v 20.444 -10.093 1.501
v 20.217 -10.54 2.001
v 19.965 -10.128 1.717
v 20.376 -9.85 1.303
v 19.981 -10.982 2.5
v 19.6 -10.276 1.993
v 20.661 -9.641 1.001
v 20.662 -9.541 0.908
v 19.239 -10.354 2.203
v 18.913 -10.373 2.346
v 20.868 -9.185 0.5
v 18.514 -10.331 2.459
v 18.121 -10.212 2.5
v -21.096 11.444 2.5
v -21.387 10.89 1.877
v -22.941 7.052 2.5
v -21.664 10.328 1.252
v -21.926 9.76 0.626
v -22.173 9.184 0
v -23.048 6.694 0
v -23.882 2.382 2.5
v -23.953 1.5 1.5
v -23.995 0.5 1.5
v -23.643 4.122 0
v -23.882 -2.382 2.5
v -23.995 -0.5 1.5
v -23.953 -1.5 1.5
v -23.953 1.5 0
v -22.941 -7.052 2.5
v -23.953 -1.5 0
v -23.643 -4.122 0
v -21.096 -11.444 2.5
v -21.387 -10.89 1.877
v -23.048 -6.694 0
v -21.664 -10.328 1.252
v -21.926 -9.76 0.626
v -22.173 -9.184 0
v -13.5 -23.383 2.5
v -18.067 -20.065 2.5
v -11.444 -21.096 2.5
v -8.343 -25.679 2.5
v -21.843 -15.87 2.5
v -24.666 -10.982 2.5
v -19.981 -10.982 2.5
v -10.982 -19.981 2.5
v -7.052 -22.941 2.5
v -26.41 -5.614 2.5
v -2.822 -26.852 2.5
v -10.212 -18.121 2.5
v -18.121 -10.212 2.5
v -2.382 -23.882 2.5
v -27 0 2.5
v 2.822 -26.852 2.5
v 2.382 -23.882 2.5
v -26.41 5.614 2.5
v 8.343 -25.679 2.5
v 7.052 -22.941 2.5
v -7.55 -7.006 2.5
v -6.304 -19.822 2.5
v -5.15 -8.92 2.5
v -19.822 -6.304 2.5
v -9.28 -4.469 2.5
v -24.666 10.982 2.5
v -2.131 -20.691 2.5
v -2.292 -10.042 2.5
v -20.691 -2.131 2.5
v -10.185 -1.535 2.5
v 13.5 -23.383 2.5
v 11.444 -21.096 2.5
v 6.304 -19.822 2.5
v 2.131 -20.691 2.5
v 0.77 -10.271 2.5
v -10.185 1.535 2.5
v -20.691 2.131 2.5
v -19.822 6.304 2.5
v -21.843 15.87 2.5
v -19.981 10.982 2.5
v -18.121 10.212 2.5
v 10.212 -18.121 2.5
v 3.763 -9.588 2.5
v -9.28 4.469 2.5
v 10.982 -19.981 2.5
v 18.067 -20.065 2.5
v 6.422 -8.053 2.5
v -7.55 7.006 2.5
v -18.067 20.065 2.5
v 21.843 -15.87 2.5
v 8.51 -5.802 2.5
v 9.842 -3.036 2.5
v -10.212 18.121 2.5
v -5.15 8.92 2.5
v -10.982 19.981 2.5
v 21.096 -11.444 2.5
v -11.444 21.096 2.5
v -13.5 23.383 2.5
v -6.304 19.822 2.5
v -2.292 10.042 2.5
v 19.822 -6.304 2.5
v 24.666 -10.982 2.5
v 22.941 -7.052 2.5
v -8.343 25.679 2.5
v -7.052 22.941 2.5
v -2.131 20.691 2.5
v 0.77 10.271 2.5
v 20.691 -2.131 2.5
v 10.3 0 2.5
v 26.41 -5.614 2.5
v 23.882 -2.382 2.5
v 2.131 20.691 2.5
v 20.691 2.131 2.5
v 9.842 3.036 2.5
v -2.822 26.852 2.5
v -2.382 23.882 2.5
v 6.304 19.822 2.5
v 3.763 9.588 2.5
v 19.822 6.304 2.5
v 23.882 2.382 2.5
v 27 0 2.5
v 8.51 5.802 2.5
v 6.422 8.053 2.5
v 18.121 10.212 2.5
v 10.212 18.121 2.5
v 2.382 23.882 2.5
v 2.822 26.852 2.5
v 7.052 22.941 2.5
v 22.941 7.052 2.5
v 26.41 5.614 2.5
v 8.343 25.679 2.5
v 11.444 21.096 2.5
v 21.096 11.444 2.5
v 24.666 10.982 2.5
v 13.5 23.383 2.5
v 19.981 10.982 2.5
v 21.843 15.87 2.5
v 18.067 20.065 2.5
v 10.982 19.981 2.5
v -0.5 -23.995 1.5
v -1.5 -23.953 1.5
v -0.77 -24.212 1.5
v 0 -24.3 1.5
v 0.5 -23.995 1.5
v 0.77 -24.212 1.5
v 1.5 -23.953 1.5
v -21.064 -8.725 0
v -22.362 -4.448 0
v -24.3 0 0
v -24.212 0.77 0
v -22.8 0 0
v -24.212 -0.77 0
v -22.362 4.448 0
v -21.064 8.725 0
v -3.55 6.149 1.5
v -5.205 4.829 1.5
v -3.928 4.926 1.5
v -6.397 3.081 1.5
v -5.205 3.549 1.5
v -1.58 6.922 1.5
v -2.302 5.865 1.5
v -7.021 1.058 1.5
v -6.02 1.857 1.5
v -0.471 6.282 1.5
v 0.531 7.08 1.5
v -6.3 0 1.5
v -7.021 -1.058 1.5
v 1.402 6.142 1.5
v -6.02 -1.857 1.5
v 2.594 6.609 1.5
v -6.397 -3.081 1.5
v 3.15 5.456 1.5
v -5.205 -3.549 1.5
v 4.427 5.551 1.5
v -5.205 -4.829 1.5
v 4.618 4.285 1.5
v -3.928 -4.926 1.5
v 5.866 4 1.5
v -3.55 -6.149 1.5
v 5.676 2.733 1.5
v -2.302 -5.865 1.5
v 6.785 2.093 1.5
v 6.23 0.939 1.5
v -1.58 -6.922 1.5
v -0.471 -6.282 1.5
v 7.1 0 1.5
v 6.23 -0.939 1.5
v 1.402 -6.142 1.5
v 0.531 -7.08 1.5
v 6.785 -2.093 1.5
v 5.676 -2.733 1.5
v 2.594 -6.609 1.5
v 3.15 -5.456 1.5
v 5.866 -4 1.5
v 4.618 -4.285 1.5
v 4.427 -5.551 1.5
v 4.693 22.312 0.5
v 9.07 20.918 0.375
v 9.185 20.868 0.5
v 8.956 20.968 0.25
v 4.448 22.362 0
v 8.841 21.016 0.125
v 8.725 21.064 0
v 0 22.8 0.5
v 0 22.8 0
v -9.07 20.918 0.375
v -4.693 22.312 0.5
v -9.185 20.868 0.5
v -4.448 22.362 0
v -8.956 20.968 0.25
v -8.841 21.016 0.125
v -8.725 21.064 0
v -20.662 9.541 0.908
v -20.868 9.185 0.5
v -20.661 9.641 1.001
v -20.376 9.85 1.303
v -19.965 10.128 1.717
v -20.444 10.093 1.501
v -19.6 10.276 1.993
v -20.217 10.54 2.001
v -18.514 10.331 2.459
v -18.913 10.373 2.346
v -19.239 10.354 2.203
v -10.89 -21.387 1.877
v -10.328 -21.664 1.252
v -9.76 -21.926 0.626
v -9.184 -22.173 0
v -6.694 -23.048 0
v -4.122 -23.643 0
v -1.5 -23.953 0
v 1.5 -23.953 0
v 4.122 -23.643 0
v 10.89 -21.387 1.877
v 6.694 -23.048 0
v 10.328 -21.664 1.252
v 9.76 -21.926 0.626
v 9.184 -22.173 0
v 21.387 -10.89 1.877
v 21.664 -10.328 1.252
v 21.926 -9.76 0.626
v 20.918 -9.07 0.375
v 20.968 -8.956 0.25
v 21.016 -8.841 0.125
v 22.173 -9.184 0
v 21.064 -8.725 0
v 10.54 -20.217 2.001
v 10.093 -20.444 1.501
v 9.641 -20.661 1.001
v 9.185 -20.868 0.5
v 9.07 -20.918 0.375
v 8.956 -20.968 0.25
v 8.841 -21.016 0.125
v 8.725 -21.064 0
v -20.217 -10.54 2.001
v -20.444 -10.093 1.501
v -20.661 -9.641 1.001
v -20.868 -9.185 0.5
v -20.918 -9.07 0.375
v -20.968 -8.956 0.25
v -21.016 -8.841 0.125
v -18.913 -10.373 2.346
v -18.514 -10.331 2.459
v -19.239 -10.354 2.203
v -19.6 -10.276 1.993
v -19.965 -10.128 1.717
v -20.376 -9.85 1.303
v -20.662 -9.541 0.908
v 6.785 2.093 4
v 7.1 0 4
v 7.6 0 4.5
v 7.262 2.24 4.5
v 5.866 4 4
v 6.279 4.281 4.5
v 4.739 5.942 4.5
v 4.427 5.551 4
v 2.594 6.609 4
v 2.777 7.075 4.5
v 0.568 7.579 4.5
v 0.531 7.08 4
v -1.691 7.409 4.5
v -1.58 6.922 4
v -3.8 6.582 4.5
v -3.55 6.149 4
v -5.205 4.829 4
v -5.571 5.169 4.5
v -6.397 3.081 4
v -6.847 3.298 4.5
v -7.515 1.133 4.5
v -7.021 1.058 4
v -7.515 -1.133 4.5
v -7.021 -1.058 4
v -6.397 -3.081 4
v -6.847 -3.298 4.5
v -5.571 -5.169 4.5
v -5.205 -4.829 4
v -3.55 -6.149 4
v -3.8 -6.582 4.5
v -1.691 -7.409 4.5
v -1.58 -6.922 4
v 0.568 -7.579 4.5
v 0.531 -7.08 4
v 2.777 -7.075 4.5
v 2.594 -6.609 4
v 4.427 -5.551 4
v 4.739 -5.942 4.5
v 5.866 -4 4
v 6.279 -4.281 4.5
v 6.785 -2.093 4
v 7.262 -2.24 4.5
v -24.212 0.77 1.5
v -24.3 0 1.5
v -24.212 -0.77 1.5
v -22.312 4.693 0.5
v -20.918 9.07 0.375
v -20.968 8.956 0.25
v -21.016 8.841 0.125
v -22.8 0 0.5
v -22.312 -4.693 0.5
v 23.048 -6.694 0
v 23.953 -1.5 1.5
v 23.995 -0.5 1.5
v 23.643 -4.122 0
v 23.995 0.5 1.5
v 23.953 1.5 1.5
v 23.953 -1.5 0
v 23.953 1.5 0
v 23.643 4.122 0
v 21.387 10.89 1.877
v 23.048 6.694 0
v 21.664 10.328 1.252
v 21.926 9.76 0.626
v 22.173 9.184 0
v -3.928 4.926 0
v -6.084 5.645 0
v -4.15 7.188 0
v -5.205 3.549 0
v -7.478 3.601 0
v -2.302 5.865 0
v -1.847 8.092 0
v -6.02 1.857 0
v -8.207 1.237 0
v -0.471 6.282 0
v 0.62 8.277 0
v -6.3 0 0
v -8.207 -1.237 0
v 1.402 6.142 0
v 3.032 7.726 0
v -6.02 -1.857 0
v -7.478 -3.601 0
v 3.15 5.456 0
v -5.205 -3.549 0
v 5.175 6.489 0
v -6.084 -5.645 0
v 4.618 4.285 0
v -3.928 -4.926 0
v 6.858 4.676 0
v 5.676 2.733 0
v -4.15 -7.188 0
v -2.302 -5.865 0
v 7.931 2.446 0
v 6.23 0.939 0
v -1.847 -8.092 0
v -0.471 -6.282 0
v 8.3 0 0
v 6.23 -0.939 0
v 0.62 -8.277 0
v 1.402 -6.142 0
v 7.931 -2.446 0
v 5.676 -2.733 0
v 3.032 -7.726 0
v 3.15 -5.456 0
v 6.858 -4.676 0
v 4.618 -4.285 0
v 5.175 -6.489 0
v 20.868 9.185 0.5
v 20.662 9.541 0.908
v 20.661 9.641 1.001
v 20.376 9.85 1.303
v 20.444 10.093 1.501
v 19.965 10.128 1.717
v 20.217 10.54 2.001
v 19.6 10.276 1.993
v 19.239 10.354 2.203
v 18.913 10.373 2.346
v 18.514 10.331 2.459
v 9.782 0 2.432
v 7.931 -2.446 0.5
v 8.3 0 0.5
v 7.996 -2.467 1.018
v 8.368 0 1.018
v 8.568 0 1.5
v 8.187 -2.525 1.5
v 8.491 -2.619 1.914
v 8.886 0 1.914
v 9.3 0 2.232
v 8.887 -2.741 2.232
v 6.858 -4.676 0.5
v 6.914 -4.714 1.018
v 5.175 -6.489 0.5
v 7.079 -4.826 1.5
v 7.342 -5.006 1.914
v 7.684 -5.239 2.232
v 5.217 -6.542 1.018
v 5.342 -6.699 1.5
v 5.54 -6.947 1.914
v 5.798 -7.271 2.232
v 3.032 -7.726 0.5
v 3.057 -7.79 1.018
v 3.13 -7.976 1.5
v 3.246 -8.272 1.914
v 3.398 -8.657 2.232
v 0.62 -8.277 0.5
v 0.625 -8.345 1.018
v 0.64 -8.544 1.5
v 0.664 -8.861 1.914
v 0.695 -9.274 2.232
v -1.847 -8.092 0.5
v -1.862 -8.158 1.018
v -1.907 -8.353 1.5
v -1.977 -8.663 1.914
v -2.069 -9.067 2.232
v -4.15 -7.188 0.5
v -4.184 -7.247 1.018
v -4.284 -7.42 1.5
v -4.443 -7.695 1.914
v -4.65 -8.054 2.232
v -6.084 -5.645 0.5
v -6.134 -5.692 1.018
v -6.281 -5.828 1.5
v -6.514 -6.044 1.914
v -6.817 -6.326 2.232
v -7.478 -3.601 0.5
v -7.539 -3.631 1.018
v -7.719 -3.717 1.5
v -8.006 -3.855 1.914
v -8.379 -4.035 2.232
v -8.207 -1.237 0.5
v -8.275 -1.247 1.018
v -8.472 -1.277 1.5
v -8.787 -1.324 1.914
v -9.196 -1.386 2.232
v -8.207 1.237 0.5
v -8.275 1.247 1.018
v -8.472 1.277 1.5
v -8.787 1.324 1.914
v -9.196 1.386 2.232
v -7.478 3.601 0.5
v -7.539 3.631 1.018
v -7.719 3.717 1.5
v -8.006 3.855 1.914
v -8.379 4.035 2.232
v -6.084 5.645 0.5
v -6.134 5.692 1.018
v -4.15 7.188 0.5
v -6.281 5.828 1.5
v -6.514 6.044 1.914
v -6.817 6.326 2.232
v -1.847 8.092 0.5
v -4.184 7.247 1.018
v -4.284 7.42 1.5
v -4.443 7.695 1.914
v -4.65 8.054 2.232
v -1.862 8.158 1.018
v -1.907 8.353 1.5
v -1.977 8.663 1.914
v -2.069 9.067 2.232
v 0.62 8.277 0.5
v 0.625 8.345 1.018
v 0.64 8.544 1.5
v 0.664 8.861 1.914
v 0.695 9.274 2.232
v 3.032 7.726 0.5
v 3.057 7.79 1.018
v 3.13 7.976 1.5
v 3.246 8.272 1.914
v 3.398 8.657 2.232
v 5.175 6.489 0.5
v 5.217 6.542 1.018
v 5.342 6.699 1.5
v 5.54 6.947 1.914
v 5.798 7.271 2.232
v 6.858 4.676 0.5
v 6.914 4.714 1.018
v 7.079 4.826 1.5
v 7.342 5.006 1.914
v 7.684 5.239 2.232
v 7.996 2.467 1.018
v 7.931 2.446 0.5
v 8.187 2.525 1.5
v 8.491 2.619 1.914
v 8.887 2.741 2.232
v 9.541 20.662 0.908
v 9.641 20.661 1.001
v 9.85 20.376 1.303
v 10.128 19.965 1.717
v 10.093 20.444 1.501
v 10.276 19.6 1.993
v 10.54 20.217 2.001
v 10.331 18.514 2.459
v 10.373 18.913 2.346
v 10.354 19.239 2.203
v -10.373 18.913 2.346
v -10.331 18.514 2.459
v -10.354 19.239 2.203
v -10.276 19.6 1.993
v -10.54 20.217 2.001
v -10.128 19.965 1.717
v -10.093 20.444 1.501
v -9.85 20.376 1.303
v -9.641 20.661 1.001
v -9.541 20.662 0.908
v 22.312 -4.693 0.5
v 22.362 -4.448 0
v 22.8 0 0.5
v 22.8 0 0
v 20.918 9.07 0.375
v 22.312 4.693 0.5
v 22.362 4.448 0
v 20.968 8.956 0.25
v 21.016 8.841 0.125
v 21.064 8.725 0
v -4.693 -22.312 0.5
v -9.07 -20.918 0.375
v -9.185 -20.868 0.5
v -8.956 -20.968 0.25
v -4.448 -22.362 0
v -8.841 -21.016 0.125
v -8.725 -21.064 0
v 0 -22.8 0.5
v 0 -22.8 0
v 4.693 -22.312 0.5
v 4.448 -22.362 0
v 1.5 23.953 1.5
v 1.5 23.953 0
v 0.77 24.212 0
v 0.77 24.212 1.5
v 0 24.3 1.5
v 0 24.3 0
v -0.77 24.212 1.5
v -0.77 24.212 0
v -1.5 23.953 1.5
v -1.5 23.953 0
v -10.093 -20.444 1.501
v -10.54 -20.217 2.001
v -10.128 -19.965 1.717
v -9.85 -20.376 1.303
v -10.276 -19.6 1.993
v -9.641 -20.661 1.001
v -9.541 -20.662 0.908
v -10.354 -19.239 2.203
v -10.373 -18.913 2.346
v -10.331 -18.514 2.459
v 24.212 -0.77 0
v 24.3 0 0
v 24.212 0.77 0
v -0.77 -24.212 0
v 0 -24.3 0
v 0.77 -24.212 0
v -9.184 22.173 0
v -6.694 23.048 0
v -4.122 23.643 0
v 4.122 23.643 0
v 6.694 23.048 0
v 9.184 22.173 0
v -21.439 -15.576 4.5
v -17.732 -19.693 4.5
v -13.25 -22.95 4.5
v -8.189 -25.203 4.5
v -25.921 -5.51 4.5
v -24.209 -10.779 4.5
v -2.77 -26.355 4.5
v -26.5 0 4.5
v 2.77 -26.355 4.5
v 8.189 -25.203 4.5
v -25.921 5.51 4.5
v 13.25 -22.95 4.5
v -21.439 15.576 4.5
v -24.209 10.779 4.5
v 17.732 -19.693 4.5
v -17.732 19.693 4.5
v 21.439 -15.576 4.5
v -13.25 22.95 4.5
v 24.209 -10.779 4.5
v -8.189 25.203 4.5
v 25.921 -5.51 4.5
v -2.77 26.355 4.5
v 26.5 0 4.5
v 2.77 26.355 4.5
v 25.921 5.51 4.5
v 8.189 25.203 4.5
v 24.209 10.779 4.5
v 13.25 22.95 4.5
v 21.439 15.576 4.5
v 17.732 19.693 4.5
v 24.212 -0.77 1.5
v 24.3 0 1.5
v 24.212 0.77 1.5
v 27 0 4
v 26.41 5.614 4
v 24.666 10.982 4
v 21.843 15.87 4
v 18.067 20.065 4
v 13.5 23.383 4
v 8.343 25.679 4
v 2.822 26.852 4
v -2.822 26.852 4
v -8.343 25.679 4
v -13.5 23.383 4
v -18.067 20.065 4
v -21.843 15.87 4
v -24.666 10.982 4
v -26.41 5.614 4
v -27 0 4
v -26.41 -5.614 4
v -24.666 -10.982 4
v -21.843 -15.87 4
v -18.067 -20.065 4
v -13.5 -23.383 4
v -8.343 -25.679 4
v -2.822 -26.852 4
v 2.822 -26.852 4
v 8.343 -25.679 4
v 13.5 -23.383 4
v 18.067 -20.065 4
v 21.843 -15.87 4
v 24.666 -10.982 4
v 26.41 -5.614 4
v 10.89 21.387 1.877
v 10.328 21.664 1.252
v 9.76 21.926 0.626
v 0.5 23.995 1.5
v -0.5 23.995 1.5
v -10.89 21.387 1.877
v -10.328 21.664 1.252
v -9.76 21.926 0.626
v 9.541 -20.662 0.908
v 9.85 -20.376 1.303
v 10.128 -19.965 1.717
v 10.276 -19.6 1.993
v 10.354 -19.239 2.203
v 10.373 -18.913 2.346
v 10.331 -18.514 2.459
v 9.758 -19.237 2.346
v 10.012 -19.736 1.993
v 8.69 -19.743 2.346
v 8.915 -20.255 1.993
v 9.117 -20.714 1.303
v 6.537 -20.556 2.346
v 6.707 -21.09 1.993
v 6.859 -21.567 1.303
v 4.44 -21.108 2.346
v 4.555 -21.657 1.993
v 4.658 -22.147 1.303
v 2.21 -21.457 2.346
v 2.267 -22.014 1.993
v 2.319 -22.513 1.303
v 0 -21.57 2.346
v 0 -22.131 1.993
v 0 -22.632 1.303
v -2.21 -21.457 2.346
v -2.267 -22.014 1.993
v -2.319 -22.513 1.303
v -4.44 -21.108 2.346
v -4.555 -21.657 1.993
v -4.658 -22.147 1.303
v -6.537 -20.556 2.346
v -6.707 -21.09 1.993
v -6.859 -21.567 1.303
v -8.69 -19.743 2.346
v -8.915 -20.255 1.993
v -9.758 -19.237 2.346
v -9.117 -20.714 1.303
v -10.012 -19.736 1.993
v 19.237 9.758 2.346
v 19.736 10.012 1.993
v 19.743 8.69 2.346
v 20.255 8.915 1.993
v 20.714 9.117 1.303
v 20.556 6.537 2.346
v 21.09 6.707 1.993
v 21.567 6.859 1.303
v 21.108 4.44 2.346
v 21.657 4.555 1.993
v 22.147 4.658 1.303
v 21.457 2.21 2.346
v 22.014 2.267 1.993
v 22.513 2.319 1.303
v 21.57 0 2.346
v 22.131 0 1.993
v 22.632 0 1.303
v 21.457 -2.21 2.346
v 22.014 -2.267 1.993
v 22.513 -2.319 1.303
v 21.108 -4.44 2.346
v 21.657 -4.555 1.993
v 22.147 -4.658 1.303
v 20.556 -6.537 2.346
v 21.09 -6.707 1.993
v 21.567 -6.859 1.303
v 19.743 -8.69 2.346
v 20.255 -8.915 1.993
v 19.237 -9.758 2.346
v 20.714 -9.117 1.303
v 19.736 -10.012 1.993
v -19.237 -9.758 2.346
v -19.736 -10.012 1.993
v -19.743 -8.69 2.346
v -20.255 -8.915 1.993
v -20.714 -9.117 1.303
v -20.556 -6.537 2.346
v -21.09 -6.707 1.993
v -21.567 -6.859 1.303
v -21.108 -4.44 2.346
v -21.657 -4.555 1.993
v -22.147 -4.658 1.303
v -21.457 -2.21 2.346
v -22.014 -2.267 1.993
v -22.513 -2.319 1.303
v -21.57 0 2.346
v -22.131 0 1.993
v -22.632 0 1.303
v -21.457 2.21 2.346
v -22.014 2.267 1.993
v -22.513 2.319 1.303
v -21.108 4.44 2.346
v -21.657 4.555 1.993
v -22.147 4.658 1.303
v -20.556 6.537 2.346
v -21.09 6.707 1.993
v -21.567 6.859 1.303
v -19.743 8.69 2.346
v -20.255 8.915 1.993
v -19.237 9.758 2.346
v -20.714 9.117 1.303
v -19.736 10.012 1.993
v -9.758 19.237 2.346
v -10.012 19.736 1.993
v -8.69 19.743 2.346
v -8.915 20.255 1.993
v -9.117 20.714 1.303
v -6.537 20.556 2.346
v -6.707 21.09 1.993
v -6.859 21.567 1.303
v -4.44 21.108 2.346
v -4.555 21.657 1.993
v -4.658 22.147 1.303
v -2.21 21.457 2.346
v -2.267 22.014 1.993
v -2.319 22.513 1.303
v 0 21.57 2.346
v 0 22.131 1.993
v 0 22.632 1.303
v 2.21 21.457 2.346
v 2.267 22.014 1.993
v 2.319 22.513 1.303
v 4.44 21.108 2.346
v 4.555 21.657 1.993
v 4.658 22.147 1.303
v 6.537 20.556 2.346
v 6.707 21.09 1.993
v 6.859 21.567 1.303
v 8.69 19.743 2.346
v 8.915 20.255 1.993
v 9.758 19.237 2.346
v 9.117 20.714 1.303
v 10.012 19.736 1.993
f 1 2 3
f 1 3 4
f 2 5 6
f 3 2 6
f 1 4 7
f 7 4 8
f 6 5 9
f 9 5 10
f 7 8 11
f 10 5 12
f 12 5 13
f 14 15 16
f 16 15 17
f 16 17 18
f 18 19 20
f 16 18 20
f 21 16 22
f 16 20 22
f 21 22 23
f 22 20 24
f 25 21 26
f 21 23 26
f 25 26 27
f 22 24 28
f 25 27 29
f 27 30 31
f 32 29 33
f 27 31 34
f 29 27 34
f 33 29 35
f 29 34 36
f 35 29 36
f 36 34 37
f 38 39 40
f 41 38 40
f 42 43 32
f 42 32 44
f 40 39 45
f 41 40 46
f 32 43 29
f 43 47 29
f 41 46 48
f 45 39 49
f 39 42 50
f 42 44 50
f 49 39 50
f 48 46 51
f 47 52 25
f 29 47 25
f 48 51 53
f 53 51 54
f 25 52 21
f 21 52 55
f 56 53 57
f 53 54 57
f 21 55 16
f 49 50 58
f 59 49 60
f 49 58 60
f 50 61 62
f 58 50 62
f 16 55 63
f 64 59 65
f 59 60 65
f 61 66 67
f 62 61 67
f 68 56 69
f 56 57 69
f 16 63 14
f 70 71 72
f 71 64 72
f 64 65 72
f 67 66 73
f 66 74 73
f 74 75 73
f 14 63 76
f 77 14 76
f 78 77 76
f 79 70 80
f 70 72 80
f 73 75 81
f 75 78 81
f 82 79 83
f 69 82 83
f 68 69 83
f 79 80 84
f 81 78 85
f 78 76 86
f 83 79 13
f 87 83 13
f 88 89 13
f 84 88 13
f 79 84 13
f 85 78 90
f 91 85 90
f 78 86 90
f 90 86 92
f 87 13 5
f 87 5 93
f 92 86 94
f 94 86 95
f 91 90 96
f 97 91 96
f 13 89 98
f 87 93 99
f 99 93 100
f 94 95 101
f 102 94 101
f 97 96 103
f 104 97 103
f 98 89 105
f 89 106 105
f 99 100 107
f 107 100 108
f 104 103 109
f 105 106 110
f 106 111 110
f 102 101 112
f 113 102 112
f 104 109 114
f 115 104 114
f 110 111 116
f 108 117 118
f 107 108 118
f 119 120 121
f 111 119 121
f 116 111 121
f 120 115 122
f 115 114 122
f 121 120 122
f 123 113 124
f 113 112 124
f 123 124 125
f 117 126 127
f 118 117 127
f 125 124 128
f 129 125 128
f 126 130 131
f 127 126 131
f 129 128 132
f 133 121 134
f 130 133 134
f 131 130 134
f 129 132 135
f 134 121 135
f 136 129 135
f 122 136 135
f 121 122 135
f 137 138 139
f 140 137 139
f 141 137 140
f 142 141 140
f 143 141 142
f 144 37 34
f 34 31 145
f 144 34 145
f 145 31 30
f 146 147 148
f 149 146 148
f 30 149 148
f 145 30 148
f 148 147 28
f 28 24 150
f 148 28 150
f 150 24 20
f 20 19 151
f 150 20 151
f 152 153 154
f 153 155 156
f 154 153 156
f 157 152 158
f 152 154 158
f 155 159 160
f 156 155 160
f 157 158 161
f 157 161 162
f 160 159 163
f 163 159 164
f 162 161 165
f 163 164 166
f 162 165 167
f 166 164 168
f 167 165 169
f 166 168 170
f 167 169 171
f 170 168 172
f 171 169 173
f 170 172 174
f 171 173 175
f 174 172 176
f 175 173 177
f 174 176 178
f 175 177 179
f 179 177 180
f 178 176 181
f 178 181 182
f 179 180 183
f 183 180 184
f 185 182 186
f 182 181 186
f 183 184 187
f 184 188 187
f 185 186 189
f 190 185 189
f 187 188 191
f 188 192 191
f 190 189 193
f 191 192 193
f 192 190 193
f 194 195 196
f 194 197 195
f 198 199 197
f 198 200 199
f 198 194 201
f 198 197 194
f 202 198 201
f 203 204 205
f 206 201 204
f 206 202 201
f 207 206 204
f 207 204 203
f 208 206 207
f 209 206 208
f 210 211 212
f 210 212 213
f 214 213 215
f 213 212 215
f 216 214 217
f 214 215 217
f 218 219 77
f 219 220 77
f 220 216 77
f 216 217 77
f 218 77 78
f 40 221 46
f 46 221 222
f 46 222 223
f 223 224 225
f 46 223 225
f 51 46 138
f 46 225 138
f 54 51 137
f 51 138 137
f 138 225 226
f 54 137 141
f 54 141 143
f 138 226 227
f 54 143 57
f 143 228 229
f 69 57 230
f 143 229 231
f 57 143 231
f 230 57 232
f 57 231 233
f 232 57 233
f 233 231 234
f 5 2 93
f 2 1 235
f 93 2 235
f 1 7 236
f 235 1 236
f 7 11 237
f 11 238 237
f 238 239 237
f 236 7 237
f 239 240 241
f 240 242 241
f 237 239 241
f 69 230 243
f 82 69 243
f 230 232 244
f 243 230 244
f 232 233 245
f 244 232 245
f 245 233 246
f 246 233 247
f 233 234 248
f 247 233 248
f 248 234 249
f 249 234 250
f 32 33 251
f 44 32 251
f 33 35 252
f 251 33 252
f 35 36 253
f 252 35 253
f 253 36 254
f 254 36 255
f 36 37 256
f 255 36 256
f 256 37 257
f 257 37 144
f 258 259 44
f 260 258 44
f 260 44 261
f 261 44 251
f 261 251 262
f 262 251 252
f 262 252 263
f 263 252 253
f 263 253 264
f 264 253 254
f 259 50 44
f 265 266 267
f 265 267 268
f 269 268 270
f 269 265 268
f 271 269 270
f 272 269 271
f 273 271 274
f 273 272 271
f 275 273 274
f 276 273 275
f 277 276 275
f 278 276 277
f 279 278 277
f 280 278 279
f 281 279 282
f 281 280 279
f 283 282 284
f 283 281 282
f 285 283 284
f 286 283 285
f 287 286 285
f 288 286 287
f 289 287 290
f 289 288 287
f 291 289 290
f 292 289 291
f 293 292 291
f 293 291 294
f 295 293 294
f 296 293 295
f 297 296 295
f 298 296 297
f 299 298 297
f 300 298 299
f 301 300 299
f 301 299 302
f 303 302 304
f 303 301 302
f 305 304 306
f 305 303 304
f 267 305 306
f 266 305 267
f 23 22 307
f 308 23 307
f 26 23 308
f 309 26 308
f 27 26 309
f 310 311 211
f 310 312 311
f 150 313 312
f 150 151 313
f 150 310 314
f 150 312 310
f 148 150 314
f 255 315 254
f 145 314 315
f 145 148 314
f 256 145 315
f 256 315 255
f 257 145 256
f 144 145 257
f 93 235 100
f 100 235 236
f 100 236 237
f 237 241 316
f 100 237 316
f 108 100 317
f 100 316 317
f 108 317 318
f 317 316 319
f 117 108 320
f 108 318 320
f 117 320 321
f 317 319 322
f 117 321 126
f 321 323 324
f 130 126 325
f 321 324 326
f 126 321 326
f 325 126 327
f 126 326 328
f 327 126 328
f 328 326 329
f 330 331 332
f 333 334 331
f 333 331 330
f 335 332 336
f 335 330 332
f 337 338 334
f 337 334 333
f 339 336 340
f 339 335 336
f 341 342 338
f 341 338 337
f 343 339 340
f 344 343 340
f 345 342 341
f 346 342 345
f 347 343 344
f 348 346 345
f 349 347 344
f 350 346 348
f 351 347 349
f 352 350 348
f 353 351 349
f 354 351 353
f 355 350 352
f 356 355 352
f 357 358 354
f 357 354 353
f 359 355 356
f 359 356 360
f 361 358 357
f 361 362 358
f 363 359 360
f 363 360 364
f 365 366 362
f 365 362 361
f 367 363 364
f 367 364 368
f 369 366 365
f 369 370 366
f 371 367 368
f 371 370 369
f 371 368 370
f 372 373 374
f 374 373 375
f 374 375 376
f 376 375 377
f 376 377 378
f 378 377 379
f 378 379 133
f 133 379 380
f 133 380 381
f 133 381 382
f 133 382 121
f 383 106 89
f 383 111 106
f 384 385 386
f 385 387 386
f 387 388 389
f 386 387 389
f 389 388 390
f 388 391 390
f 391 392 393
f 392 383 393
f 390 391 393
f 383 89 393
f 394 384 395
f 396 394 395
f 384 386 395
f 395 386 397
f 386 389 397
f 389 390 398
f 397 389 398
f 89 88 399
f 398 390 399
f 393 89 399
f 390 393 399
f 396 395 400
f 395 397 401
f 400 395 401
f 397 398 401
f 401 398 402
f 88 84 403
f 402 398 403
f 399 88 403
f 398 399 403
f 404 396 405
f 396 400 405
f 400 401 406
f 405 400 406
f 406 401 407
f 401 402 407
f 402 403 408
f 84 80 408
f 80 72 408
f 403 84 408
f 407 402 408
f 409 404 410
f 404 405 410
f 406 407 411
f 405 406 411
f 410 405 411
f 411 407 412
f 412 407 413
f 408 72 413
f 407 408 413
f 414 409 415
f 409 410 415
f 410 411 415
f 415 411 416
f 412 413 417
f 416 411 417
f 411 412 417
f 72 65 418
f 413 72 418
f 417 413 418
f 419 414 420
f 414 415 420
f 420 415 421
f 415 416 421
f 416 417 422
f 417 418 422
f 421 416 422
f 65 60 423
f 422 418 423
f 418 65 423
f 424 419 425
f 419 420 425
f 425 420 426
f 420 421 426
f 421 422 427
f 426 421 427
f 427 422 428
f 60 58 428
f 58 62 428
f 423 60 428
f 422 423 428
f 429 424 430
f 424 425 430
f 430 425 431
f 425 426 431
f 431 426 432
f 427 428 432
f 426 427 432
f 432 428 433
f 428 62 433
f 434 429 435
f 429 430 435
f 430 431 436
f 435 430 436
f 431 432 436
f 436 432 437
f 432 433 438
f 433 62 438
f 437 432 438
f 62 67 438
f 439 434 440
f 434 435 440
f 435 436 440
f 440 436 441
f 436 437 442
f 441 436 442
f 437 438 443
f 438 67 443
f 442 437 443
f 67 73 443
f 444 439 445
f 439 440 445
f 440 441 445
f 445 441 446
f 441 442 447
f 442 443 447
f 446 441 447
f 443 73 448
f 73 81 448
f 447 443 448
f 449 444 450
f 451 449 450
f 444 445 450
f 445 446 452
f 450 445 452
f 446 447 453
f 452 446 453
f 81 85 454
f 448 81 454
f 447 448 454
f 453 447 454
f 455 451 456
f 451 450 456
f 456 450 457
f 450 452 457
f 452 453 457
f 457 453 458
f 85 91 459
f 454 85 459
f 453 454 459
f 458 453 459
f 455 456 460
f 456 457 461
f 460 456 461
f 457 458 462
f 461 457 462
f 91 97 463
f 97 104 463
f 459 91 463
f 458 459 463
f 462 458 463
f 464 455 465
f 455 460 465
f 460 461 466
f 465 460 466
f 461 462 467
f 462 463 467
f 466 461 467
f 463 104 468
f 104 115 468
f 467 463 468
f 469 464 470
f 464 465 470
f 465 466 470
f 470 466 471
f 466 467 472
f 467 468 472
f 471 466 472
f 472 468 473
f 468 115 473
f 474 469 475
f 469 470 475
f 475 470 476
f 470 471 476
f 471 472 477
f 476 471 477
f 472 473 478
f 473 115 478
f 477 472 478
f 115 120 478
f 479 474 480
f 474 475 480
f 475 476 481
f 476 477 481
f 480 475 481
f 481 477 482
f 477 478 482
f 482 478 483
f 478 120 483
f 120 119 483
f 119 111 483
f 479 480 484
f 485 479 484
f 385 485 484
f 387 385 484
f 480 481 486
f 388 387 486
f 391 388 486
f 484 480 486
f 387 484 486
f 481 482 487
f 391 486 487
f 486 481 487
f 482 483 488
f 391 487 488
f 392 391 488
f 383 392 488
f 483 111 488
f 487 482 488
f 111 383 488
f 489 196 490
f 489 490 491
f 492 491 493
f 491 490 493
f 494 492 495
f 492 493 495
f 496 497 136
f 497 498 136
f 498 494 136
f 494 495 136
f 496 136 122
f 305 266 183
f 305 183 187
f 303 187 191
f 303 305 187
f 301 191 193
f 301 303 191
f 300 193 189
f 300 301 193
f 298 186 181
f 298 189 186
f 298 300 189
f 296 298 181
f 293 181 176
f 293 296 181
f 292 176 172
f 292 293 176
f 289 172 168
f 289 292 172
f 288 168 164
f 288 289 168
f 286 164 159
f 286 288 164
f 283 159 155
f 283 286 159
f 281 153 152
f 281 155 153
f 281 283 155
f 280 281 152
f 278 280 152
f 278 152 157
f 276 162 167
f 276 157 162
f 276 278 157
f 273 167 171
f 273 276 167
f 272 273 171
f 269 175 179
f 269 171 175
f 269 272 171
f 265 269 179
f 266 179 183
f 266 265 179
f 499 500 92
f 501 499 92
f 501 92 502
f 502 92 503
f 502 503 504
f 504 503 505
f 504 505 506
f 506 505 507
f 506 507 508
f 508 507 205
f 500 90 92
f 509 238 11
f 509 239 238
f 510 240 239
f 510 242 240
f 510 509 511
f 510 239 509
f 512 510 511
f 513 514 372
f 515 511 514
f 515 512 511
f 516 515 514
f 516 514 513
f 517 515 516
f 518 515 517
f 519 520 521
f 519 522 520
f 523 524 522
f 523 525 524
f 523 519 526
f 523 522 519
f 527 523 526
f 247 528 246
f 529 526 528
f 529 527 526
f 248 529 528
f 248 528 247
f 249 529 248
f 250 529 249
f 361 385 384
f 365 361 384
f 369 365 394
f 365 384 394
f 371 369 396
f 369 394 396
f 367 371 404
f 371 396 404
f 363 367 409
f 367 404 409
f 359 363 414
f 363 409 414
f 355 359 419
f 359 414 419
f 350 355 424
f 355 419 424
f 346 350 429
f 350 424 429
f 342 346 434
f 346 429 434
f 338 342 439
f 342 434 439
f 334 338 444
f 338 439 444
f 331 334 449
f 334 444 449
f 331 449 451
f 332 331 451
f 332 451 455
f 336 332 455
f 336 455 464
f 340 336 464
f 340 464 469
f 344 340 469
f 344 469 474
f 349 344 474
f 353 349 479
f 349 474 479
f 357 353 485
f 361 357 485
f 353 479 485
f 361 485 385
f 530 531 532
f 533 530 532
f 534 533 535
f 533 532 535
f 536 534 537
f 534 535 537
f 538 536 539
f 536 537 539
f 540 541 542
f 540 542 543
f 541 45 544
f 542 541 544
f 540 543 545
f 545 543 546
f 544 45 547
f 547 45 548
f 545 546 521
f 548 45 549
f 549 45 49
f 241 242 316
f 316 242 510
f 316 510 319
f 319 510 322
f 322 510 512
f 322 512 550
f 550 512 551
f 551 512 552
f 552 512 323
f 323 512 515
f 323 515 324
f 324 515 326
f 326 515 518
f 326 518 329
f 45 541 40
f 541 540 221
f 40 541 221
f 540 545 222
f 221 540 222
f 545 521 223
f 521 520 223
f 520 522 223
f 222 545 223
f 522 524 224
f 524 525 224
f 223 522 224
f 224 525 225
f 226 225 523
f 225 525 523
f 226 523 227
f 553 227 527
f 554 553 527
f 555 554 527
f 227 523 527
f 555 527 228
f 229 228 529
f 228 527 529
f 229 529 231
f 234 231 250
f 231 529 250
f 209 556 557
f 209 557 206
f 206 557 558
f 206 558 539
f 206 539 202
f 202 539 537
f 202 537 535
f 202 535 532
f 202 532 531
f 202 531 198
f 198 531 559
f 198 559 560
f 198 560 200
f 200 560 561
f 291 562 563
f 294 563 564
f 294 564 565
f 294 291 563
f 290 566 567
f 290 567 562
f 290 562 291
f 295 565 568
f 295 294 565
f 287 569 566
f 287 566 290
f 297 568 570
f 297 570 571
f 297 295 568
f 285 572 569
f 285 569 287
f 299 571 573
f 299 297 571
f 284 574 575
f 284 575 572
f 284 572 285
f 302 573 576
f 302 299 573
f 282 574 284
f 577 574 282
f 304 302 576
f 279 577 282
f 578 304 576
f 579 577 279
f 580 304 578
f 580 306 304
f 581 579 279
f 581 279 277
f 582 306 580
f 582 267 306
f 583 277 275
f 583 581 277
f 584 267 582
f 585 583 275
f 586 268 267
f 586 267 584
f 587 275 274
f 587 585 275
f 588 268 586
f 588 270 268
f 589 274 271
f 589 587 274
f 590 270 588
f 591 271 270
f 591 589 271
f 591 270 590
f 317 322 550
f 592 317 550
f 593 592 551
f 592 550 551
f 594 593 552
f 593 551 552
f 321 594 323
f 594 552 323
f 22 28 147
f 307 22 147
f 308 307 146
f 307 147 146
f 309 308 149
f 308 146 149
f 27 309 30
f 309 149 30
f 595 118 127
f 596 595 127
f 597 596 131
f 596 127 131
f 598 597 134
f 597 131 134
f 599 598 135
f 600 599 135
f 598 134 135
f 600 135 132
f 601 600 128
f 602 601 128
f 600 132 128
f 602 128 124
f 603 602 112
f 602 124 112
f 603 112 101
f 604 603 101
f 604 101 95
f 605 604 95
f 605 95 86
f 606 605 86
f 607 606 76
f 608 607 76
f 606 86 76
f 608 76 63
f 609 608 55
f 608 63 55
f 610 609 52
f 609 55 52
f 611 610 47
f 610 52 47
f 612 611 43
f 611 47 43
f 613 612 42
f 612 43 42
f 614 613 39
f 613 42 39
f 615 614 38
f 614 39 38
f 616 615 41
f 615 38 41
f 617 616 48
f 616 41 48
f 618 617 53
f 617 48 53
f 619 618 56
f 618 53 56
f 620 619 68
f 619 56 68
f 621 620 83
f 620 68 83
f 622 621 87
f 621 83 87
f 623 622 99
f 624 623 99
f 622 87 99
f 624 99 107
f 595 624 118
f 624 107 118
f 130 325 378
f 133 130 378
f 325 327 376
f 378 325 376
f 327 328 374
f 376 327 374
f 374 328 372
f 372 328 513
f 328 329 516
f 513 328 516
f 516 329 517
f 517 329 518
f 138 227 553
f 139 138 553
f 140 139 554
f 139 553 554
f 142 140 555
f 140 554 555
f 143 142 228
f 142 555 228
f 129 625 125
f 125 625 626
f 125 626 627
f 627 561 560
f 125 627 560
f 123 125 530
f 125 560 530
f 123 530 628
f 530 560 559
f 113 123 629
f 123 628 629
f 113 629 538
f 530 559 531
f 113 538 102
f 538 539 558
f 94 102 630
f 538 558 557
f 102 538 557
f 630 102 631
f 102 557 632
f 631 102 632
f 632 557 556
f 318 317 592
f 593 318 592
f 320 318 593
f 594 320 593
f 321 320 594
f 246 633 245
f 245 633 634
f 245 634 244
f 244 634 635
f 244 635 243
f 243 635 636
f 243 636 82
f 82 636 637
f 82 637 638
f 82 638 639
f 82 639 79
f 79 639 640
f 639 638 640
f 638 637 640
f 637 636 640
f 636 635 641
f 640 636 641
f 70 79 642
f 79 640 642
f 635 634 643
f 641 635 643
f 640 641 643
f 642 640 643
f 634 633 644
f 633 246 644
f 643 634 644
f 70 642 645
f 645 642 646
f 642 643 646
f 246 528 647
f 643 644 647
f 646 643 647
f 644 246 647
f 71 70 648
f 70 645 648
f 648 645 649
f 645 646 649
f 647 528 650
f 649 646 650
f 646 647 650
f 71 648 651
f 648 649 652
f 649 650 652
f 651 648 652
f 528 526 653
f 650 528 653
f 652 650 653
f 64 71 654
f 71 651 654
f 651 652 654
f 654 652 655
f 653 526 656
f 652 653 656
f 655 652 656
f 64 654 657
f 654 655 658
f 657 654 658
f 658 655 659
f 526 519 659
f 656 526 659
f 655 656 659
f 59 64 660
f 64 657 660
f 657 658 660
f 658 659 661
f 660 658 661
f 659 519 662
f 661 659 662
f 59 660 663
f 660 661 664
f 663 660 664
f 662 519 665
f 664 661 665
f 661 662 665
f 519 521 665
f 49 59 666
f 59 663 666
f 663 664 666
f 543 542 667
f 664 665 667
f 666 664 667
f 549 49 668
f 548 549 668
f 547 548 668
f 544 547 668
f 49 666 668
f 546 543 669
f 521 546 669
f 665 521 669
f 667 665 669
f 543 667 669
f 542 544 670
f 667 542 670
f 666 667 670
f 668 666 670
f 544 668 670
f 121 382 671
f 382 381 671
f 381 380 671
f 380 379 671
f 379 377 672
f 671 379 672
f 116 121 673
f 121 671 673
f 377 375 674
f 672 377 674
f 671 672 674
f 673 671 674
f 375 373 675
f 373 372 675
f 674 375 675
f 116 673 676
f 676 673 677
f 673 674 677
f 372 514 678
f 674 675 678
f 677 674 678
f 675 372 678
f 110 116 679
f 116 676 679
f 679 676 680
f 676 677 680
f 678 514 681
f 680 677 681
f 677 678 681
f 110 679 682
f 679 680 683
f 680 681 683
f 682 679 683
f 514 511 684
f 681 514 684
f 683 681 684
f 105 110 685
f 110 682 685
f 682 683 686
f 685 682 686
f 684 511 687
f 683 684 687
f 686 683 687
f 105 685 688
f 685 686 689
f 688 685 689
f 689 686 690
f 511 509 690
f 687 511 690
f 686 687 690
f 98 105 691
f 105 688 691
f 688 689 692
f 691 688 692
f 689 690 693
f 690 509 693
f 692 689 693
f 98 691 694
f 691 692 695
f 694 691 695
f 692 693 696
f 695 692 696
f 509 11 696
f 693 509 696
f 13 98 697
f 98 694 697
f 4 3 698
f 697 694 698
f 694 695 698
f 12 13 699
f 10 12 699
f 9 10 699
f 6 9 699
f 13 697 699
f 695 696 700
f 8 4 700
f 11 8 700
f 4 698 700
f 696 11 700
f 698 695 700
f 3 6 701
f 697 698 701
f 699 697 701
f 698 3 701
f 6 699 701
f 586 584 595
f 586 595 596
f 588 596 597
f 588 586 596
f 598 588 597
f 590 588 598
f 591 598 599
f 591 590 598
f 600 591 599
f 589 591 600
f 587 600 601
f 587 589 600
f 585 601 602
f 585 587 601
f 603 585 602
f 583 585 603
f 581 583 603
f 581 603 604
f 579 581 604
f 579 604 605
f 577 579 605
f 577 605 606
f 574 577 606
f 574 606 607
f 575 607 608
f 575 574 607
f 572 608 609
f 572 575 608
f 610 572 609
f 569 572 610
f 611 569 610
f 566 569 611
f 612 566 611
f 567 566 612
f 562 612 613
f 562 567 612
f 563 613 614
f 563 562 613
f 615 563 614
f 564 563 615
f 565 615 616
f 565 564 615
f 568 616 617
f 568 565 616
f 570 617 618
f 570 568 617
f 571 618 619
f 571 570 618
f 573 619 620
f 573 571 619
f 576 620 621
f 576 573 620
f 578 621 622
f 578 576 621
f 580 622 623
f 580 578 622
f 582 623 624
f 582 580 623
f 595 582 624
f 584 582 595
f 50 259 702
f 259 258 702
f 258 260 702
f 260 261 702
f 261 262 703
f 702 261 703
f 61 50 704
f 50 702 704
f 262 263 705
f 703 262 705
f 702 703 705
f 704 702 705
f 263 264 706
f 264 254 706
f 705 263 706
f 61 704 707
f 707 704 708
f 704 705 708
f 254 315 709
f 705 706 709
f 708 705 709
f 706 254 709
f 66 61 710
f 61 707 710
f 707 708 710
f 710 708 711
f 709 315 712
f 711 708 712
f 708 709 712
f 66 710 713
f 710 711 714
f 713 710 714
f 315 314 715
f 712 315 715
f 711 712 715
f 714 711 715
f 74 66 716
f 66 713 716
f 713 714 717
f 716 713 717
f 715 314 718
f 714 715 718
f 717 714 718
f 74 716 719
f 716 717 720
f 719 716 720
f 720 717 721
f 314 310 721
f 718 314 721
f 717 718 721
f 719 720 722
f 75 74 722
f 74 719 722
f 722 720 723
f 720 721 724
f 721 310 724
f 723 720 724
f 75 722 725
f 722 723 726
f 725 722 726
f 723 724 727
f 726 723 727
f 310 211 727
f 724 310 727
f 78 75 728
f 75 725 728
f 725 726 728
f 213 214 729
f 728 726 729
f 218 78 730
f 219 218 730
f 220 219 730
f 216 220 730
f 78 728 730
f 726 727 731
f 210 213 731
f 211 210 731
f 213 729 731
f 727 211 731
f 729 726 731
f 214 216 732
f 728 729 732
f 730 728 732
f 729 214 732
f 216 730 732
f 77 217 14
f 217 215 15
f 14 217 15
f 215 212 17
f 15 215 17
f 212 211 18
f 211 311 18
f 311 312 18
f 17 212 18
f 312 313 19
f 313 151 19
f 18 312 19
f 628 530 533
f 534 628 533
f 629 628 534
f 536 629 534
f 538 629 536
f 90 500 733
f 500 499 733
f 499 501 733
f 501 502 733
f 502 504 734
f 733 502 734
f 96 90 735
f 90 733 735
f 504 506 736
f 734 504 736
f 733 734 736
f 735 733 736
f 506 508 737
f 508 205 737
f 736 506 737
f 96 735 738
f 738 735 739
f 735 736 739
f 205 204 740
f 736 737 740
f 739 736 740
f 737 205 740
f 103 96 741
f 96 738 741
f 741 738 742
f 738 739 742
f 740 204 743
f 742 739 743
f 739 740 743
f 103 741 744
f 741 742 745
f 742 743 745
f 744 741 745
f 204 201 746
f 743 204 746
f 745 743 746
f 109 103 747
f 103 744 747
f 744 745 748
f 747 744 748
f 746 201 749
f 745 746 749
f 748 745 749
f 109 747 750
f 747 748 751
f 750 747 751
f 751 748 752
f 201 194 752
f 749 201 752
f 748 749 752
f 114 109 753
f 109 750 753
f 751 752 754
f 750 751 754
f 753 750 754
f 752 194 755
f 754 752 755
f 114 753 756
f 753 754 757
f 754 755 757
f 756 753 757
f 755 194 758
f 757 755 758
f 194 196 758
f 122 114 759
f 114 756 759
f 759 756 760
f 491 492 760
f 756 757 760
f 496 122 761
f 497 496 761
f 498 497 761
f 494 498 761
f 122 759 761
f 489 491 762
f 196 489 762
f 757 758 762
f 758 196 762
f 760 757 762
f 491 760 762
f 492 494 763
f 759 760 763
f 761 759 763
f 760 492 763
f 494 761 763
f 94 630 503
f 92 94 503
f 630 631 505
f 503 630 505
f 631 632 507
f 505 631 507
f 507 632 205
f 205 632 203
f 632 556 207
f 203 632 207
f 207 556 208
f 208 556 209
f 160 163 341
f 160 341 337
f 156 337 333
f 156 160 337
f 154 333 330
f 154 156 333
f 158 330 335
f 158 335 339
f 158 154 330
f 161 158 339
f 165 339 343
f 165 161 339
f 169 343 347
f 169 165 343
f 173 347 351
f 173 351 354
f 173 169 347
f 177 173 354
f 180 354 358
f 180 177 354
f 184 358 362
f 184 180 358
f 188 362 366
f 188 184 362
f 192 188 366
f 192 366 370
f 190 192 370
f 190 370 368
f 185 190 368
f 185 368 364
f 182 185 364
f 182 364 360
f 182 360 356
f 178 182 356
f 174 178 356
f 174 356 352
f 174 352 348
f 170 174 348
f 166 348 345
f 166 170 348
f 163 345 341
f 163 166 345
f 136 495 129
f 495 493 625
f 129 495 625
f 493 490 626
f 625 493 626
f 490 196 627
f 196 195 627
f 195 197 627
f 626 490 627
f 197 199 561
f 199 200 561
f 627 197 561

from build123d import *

# Parameters (mm, degrees)
SKETCH1_R                    = 24
SKETCH1_R_2                  = 22.8
BOSS_EXTRUDE1_DEPTH          = 2.5
BOSS_EXTRUDE5_START          = -2.5
BOSS_EXTRUDE5_DEPTH          = 1.5
CIRPATTERN1_COUNT            = 4
SKETCH2_R                    = 27
BOSS_EXTRUDE2_DEPTH          = 2
SKETCH3_R                    = 7.1
CUT_EXTRUDE1_DEPTH           = 39.448016854
SKETCH4_R                    = 8.3
SKETCH4_R_2                  = 7.1
BOSS_EXTRUDE3_DEPTH          = 2.5
BOSS_EXTRUDE4_START          = -1.5
SKETCH5_R                    = 8.3
SKETCH5_R_2                  = 6.3
BOSS_EXTRUDE4_DEPTH          = 1.5
CUT_EXTRUDE2_DEPTH           = 2.5
CHAMFER2_SIZE                = 2.5
CIRPATTERN2_COUNT            = 4
CHAMFER2_OF_CIRPATTERN2_SIZE = 2.5
FILLET1_R                    = 2
CHAMFER1_SIZE                = 0.5


# Some blends are built 0.0001 mm under size
with BuildPart() as part:
    # Sketch1 → Boss-Extrude1 (new body)
    with BuildSketch(Plane.XY):
        Circle(SKETCH1_R)
        Circle(SKETCH1_R_2, mode=Mode.SUBTRACT)
    extrude(amount=BOSS_EXTRUDE1_DEPTH)

    # Sketch6 → Boss-Extrude5 (add)
    with BuildSketch(Plane.XY.offset(2.5).offset(BOSS_EXTRUDE5_START)):
        with BuildLine():
            ThreePointArc((23.953079134, 1.5), (24, 0), (23.953079134, -1.5))
            ThreePointArc((23.953079134, -1.5), (24.3, 0), (23.953079134, 1.5))
        make_face()
    boss_extrude5 = extrude(amount=BOSS_EXTRUDE5_DEPTH)

    # CirPattern1: Boss-Extrude5 ×4 about axis
    cirpattern1_axis = Axis((0, 0, 0), (0, 0, 1))
    for i in range(1, CIRPATTERN1_COUNT):
        add(boss_extrude5.rotate(cirpattern1_axis, i * 360 / CIRPATTERN1_COUNT))

    # Sketch2 → Boss-Extrude2 (add)
    with BuildSketch(Plane.XY.offset(2.5)):
        Circle(SKETCH2_R)
    extrude(amount=BOSS_EXTRUDE2_DEPTH)

    # Sketch3 → Cut-Extrude1 (cut, through all)
    with BuildSketch(Plane.XY.offset(4.5)):
        Circle(SKETCH3_R)
    extrude(amount=-CUT_EXTRUDE1_DEPTH, mode=Mode.SUBTRACT)

    # Sketch4 → Boss-Extrude3 (add, through all)
    with BuildSketch(Plane(origin=(0, 0, 2.5), x_dir=(-1, 0, 0), z_dir=(0, 0, -1))):
        with Locations(Location((0, 0, 0), (0, 0, 180))):
            Circle(SKETCH4_R)
        with Locations(Location((0, 0, 0), (0, 0, 180))):
            Circle(SKETCH4_R_2, mode=Mode.SUBTRACT)
    extrude(amount=BOSS_EXTRUDE3_DEPTH)

    # Sketch5 → Boss-Extrude4 (add)
    with BuildSketch(Plane(origin=(0, 0, 0), x_dir=(-1, 0, 0), z_dir=(0, 0, -1)).offset(BOSS_EXTRUDE4_START)):
        with Locations(Location((0, 0, 0), (0, 0, 180))):
            Circle(SKETCH5_R)
        Circle(SKETCH5_R_2, mode=Mode.SUBTRACT)
    extrude(amount=BOSS_EXTRUDE4_DEPTH)

    # Sketch7 → Cut-Extrude2 (cut)
    with BuildSketch(Plane(origin=(0, 0, 0), x_dir=(-1, 0, 0), z_dir=(0, 0, -1))):
        with BuildLine():
            ThreePointArc((8.725182258, 21.064453341), (12.667001313, 18.95750716), (16.122034611, 16.122034611))
            Line((16.122034611, 16.122034611), (16.970562748, 16.970562748))
            ThreePointArc((16.970562748, 16.970562748), (13.333685592, 19.955270695), (9.184402377, 22.17310878))
            Line((9.184402377, 22.17310878), (8.725182258, 21.064453341))
        make_face()
        with BuildLine():
            Line((16.970562748, 16.970562748), (16.122034611, 16.122034611))
            ThreePointArc((16.122034611, 16.122034611), (18.95750716, 12.667001313), (21.064453341, 8.725182258))
            Line((21.064453341, 8.725182258), (22.17310878, 9.184402377))
            ThreePointArc((22.17310878, 9.184402377), (19.955270695, 13.333685592), (16.970562748, 16.970562748))
        make_face()
    cut_extrude2 = extrude(amount=-CUT_EXTRUDE2_DEPTH, mode=Mode.SUBTRACT)

    # Chamfer2
    chamfer2_edges = [part.edges().sort_by_distance(p)[0] for p in [
        (-21.618781061, 8.954792317, 2.5),
        (-8.954792317, 21.618781061, 2.5),
    ]]
    chamfer(chamfer2_edges, length=CHAMFER2_SIZE - 0.0001)  # a hair under: the kernel refuses the full size

    # CirPattern2: Cut-Extrude2 ×4 about axis
    cirpattern2_axis = Axis((0, 0, 0), (0, 0, 1))
    for i in range(1, CIRPATTERN2_COUNT):
        add(cut_extrude2.rotate(cirpattern2_axis, i * 360 / CIRPATTERN2_COUNT), mode=Mode.SUBTRACT)

    # Chamfer2 of CirPattern2
    chamfer2_of_cirpattern2_edges = [part.edges().sort_by_distance(p)[0] for p in [
        (-8.954792317, -21.618781061, 2.5),
        (-21.618781061, -8.954792317, 2.5),
        (21.618781061, -8.954792317, 2.5),
        (8.954792317, -21.618781061, 2.5),
        (8.954792317, 21.618781061, 2.5),
        (21.618781061, 8.954792317, 2.5),
    ]]
    chamfer(chamfer2_of_cirpattern2_edges, length=CHAMFER2_OF_CIRPATTERN2_SIZE - 0.0001)  # a hair under: the kernel refuses the full size

    # Fillet1
    # the kernel refuses this fillet: 2 mm, written as the material it adds along each edge
    with BuildSketch(Plane(origin=(0, 0, 2.5), x_dir=(1, 0, 0), z_dir=(0, 1, 0))) as fillet1_piece_1:
        with BuildLine():
            CenterArc((8.3 + FILLET1_R, FILLET1_R), FILLET1_R, 180, 90)
            Line((8.3, FILLET1_R), (8.3, 0))
            Line((8.3, 0), (8.3 + FILLET1_R, 0))
        make_face()
    revolve(axis=Axis((0, 0, 2.5), (0, 0, -1)))
    with BuildSketch(Plane(origin=(0, 0, 2.5), x_dir=(0.6608111736340745, -0.7505521919229581, 0), z_dir=(0.7505521919229581, 0.6608111736340745, 0))) as fillet1_piece_2_section:
        with BuildLine():
            CenterArc((22.8 - FILLET1_R, FILLET1_R), FILLET1_R, 270, 90)
            Line((22.8, FILLET1_R), (22.8, 0))
            Line((22.8, 0), (22.8 - FILLET1_R, 0))
        make_face()
    fillet1_piece_2 = revolve(axis=Axis((0, 0, 2.5), (0, 0, -1)), revolution_arc=82.723533759, mode=Mode.PRIVATE)
    fillet1_piece_2 = split(fillet1_piece_2, bisect_by=Plane(origin=(-4.823831946, -20.235955974, -3.287225486), z_dir=(0.653281482438186, -0.27059805007310406, 0.7071067811865476)), keep=Keep.TOP, mode=Mode.PRIVATE)
    fillet1_piece_2 = split(fillet1_piece_2, bisect_by=Plane(origin=(4.823831946, -20.235955974, -3.287225486), z_dir=(-0.6532814824381898, -0.2705980500730944, 0.7071067811865478)), keep=Keep.TOP, mode=Mode.PRIVATE)
    add(fillet1_piece_2)
    with BuildSketch(Plane(origin=(0, 0, 2.5), x_dir=(0.7505521919229583, 0.6608111736340745, 0), z_dir=(-0.6608111736340745, 0.7505521919229583, 0))) as fillet1_piece_3_section:
        with BuildLine():
            CenterArc((22.8 - FILLET1_R, FILLET1_R), FILLET1_R, 270, 90)
            Line((22.8, FILLET1_R), (22.8, 0))
            Line((22.8, 0), (22.8 - FILLET1_R, 0))
        make_face()
    fillet1_piece_3 = revolve(axis=Axis((0, 0, 2.5), (0, 0, -1)), revolution_arc=82.723533759, mode=Mode.PRIVATE)
    fillet1_piece_3 = split(fillet1_piece_3, bisect_by=Plane(origin=(20.235955974, -4.823831946, -3.287225486), z_dir=(0.2705980500731041, 0.6532814824381858, 0.7071067811865477)), keep=Keep.TOP, mode=Mode.PRIVATE)
    fillet1_piece_3 = split(fillet1_piece_3, bisect_by=Plane(origin=(20.235955974, 4.823831946, -3.287225486), z_dir=(0.27059805007309445, -0.6532814824381898, 0.7071067811865478)), keep=Keep.TOP, mode=Mode.PRIVATE)
    add(fillet1_piece_3)
    with BuildSketch(Plane(origin=(0, 0, 2.5), x_dir=(-0.750552191922958, -0.6608111736340746, 0), z_dir=(0.6608111736340746, -0.750552191922958, 0))) as fillet1_piece_4_section:
        with BuildLine():
            CenterArc((22.8 - FILLET1_R, FILLET1_R), FILLET1_R, 270, 90)
            Line((22.8, FILLET1_R), (22.8, 0))
            Line((22.8, 0), (22.8 - FILLET1_R, 0))
        make_face()
    fillet1_piece_4 = revolve(axis=Axis((0, 0, 2.5), (0, 0, -1)), revolution_arc=82.723533759, mode=Mode.PRIVATE)
    fillet1_piece_4 = split(fillet1_piece_4, bisect_by=Plane(origin=(-20.235955974, 4.823831946, -3.287225486), z_dir=(-0.2705980500731042, -0.6532814824381858, 0.7071067811865477)), keep=Keep.TOP, mode=Mode.PRIVATE)
    fillet1_piece_4 = split(fillet1_piece_4, bisect_by=Plane(origin=(-20.235955974, -4.823831946, -3.287225486), z_dir=(-0.2705980500730945, 0.6532814824381897, 0.7071067811865478)), keep=Keep.TOP, mode=Mode.PRIVATE)
    add(fillet1_piece_4)
    with BuildSketch(Plane(origin=(0, 0, 2.5), x_dir=(-0.6608111736340749, 0.7505521919229577, 0), z_dir=(-0.7505521919229577, -0.6608111736340749, 0))) as fillet1_piece_5_section:
        with BuildLine():
            CenterArc((22.8 - FILLET1_R, FILLET1_R), FILLET1_R, 270, 90)
            Line((22.8, FILLET1_R), (22.8, 0))
            Line((22.8, 0), (22.8 - FILLET1_R, 0))
        make_face()
    fillet1_piece_5 = revolve(axis=Axis((0, 0, 2.5), (0, 0, -1)), revolution_arc=82.723533759, mode=Mode.PRIVATE)
    fillet1_piece_5 = split(fillet1_piece_5, bisect_by=Plane(origin=(-4.823831946, 20.235955974, -3.287225486), z_dir=(0.6532814824381898, 0.2705980500730944, 0.7071067811865478)), keep=Keep.TOP, mode=Mode.PRIVATE)
    fillet1_piece_5 = split(fillet1_piece_5, bisect_by=Plane(origin=(4.823831946, 20.235955974, -3.287225486), z_dir=(-0.6532814824381858, 0.2705980500731041, 0.7071067811865477)), keep=Keep.TOP, mode=Mode.PRIVATE)
    add(fillet1_piece_5)

    # Chamfer1
    chamfer1_edges = [part.edges().sort_by_distance(p)[0] for p in [
        (-27, 0, 4.5),
        (-7.1, 0, 4.5),
    ]]
    chamfer(chamfer1_edges, length=CHAMFER1_SIZE)


solid = part.part
